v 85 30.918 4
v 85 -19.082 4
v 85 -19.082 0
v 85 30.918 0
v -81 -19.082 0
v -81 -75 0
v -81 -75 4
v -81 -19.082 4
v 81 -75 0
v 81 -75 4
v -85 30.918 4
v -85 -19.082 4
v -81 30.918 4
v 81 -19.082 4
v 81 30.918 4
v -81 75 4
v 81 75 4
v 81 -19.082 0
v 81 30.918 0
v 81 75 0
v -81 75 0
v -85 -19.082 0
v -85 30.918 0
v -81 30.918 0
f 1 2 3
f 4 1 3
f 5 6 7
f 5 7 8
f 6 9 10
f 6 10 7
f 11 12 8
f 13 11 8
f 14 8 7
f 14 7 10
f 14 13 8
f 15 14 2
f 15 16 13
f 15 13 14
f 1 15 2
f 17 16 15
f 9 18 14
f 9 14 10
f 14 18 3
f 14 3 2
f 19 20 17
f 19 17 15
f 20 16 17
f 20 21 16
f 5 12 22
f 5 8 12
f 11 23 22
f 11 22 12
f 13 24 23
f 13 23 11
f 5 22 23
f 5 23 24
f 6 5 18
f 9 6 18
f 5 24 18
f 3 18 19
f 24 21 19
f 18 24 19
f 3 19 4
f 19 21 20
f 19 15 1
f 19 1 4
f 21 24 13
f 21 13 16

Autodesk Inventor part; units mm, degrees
ref_plane "YZ Plane" through (0, 0, 0) normal (1, 0, 0) x (0, 1, 0)
ref_plane "XZ Plane" through (0, 0, 0) normal (0, 1, 0) x (-1, 0, 0)
ref_plane "XY Plane" through (0, 0, 0) normal (0, 0, 1) x (1, 0, 0)
sketch "Sketch1" plane through (0, 0, 0) normal (0, 0, 1) x (1, 0, 0)
  line L0 (-81, 75) -> (81, 75)
  line L1 (81, 75) -> (81, -75)
  line L2 (81, -75) -> (-81, -75)
  line L3 (-81, -75) -> (-81, 75)
  point P0 (0, 0)
  point P1 (-81, 0)
  point P2 (0, 75)
  dimension "d0" = 162
  dimension "d1" = 150
extrude "Extrusion1" add sketch "Sketch1" along normal blind 4
sketch "Sketch3" plane through (81, -75, 0) normal (1, 0, 0) x (0, 0, -1)
  line L0 (-4, 0) -> (-4, 150) projected
  line L1 (-4, 105.918) -> (0, 105.918)
  line L2 (0, 105.918) -> (0, 55.918)
  line L3 (0, 55.918) -> (-4, 55.918)
  line L4 (-4, 55.918) -> (-4, 105.918)
  point P0 (0, 75)
  dimension "d7" = 50
extrude "Extrusion3" add sketch "Sketch3" along normal blind 4
mirror "Mirror2" about plane through (0, 0, 0) normal (1, 0, 0) of "Extrusion3"
properties part number "Rampa"
